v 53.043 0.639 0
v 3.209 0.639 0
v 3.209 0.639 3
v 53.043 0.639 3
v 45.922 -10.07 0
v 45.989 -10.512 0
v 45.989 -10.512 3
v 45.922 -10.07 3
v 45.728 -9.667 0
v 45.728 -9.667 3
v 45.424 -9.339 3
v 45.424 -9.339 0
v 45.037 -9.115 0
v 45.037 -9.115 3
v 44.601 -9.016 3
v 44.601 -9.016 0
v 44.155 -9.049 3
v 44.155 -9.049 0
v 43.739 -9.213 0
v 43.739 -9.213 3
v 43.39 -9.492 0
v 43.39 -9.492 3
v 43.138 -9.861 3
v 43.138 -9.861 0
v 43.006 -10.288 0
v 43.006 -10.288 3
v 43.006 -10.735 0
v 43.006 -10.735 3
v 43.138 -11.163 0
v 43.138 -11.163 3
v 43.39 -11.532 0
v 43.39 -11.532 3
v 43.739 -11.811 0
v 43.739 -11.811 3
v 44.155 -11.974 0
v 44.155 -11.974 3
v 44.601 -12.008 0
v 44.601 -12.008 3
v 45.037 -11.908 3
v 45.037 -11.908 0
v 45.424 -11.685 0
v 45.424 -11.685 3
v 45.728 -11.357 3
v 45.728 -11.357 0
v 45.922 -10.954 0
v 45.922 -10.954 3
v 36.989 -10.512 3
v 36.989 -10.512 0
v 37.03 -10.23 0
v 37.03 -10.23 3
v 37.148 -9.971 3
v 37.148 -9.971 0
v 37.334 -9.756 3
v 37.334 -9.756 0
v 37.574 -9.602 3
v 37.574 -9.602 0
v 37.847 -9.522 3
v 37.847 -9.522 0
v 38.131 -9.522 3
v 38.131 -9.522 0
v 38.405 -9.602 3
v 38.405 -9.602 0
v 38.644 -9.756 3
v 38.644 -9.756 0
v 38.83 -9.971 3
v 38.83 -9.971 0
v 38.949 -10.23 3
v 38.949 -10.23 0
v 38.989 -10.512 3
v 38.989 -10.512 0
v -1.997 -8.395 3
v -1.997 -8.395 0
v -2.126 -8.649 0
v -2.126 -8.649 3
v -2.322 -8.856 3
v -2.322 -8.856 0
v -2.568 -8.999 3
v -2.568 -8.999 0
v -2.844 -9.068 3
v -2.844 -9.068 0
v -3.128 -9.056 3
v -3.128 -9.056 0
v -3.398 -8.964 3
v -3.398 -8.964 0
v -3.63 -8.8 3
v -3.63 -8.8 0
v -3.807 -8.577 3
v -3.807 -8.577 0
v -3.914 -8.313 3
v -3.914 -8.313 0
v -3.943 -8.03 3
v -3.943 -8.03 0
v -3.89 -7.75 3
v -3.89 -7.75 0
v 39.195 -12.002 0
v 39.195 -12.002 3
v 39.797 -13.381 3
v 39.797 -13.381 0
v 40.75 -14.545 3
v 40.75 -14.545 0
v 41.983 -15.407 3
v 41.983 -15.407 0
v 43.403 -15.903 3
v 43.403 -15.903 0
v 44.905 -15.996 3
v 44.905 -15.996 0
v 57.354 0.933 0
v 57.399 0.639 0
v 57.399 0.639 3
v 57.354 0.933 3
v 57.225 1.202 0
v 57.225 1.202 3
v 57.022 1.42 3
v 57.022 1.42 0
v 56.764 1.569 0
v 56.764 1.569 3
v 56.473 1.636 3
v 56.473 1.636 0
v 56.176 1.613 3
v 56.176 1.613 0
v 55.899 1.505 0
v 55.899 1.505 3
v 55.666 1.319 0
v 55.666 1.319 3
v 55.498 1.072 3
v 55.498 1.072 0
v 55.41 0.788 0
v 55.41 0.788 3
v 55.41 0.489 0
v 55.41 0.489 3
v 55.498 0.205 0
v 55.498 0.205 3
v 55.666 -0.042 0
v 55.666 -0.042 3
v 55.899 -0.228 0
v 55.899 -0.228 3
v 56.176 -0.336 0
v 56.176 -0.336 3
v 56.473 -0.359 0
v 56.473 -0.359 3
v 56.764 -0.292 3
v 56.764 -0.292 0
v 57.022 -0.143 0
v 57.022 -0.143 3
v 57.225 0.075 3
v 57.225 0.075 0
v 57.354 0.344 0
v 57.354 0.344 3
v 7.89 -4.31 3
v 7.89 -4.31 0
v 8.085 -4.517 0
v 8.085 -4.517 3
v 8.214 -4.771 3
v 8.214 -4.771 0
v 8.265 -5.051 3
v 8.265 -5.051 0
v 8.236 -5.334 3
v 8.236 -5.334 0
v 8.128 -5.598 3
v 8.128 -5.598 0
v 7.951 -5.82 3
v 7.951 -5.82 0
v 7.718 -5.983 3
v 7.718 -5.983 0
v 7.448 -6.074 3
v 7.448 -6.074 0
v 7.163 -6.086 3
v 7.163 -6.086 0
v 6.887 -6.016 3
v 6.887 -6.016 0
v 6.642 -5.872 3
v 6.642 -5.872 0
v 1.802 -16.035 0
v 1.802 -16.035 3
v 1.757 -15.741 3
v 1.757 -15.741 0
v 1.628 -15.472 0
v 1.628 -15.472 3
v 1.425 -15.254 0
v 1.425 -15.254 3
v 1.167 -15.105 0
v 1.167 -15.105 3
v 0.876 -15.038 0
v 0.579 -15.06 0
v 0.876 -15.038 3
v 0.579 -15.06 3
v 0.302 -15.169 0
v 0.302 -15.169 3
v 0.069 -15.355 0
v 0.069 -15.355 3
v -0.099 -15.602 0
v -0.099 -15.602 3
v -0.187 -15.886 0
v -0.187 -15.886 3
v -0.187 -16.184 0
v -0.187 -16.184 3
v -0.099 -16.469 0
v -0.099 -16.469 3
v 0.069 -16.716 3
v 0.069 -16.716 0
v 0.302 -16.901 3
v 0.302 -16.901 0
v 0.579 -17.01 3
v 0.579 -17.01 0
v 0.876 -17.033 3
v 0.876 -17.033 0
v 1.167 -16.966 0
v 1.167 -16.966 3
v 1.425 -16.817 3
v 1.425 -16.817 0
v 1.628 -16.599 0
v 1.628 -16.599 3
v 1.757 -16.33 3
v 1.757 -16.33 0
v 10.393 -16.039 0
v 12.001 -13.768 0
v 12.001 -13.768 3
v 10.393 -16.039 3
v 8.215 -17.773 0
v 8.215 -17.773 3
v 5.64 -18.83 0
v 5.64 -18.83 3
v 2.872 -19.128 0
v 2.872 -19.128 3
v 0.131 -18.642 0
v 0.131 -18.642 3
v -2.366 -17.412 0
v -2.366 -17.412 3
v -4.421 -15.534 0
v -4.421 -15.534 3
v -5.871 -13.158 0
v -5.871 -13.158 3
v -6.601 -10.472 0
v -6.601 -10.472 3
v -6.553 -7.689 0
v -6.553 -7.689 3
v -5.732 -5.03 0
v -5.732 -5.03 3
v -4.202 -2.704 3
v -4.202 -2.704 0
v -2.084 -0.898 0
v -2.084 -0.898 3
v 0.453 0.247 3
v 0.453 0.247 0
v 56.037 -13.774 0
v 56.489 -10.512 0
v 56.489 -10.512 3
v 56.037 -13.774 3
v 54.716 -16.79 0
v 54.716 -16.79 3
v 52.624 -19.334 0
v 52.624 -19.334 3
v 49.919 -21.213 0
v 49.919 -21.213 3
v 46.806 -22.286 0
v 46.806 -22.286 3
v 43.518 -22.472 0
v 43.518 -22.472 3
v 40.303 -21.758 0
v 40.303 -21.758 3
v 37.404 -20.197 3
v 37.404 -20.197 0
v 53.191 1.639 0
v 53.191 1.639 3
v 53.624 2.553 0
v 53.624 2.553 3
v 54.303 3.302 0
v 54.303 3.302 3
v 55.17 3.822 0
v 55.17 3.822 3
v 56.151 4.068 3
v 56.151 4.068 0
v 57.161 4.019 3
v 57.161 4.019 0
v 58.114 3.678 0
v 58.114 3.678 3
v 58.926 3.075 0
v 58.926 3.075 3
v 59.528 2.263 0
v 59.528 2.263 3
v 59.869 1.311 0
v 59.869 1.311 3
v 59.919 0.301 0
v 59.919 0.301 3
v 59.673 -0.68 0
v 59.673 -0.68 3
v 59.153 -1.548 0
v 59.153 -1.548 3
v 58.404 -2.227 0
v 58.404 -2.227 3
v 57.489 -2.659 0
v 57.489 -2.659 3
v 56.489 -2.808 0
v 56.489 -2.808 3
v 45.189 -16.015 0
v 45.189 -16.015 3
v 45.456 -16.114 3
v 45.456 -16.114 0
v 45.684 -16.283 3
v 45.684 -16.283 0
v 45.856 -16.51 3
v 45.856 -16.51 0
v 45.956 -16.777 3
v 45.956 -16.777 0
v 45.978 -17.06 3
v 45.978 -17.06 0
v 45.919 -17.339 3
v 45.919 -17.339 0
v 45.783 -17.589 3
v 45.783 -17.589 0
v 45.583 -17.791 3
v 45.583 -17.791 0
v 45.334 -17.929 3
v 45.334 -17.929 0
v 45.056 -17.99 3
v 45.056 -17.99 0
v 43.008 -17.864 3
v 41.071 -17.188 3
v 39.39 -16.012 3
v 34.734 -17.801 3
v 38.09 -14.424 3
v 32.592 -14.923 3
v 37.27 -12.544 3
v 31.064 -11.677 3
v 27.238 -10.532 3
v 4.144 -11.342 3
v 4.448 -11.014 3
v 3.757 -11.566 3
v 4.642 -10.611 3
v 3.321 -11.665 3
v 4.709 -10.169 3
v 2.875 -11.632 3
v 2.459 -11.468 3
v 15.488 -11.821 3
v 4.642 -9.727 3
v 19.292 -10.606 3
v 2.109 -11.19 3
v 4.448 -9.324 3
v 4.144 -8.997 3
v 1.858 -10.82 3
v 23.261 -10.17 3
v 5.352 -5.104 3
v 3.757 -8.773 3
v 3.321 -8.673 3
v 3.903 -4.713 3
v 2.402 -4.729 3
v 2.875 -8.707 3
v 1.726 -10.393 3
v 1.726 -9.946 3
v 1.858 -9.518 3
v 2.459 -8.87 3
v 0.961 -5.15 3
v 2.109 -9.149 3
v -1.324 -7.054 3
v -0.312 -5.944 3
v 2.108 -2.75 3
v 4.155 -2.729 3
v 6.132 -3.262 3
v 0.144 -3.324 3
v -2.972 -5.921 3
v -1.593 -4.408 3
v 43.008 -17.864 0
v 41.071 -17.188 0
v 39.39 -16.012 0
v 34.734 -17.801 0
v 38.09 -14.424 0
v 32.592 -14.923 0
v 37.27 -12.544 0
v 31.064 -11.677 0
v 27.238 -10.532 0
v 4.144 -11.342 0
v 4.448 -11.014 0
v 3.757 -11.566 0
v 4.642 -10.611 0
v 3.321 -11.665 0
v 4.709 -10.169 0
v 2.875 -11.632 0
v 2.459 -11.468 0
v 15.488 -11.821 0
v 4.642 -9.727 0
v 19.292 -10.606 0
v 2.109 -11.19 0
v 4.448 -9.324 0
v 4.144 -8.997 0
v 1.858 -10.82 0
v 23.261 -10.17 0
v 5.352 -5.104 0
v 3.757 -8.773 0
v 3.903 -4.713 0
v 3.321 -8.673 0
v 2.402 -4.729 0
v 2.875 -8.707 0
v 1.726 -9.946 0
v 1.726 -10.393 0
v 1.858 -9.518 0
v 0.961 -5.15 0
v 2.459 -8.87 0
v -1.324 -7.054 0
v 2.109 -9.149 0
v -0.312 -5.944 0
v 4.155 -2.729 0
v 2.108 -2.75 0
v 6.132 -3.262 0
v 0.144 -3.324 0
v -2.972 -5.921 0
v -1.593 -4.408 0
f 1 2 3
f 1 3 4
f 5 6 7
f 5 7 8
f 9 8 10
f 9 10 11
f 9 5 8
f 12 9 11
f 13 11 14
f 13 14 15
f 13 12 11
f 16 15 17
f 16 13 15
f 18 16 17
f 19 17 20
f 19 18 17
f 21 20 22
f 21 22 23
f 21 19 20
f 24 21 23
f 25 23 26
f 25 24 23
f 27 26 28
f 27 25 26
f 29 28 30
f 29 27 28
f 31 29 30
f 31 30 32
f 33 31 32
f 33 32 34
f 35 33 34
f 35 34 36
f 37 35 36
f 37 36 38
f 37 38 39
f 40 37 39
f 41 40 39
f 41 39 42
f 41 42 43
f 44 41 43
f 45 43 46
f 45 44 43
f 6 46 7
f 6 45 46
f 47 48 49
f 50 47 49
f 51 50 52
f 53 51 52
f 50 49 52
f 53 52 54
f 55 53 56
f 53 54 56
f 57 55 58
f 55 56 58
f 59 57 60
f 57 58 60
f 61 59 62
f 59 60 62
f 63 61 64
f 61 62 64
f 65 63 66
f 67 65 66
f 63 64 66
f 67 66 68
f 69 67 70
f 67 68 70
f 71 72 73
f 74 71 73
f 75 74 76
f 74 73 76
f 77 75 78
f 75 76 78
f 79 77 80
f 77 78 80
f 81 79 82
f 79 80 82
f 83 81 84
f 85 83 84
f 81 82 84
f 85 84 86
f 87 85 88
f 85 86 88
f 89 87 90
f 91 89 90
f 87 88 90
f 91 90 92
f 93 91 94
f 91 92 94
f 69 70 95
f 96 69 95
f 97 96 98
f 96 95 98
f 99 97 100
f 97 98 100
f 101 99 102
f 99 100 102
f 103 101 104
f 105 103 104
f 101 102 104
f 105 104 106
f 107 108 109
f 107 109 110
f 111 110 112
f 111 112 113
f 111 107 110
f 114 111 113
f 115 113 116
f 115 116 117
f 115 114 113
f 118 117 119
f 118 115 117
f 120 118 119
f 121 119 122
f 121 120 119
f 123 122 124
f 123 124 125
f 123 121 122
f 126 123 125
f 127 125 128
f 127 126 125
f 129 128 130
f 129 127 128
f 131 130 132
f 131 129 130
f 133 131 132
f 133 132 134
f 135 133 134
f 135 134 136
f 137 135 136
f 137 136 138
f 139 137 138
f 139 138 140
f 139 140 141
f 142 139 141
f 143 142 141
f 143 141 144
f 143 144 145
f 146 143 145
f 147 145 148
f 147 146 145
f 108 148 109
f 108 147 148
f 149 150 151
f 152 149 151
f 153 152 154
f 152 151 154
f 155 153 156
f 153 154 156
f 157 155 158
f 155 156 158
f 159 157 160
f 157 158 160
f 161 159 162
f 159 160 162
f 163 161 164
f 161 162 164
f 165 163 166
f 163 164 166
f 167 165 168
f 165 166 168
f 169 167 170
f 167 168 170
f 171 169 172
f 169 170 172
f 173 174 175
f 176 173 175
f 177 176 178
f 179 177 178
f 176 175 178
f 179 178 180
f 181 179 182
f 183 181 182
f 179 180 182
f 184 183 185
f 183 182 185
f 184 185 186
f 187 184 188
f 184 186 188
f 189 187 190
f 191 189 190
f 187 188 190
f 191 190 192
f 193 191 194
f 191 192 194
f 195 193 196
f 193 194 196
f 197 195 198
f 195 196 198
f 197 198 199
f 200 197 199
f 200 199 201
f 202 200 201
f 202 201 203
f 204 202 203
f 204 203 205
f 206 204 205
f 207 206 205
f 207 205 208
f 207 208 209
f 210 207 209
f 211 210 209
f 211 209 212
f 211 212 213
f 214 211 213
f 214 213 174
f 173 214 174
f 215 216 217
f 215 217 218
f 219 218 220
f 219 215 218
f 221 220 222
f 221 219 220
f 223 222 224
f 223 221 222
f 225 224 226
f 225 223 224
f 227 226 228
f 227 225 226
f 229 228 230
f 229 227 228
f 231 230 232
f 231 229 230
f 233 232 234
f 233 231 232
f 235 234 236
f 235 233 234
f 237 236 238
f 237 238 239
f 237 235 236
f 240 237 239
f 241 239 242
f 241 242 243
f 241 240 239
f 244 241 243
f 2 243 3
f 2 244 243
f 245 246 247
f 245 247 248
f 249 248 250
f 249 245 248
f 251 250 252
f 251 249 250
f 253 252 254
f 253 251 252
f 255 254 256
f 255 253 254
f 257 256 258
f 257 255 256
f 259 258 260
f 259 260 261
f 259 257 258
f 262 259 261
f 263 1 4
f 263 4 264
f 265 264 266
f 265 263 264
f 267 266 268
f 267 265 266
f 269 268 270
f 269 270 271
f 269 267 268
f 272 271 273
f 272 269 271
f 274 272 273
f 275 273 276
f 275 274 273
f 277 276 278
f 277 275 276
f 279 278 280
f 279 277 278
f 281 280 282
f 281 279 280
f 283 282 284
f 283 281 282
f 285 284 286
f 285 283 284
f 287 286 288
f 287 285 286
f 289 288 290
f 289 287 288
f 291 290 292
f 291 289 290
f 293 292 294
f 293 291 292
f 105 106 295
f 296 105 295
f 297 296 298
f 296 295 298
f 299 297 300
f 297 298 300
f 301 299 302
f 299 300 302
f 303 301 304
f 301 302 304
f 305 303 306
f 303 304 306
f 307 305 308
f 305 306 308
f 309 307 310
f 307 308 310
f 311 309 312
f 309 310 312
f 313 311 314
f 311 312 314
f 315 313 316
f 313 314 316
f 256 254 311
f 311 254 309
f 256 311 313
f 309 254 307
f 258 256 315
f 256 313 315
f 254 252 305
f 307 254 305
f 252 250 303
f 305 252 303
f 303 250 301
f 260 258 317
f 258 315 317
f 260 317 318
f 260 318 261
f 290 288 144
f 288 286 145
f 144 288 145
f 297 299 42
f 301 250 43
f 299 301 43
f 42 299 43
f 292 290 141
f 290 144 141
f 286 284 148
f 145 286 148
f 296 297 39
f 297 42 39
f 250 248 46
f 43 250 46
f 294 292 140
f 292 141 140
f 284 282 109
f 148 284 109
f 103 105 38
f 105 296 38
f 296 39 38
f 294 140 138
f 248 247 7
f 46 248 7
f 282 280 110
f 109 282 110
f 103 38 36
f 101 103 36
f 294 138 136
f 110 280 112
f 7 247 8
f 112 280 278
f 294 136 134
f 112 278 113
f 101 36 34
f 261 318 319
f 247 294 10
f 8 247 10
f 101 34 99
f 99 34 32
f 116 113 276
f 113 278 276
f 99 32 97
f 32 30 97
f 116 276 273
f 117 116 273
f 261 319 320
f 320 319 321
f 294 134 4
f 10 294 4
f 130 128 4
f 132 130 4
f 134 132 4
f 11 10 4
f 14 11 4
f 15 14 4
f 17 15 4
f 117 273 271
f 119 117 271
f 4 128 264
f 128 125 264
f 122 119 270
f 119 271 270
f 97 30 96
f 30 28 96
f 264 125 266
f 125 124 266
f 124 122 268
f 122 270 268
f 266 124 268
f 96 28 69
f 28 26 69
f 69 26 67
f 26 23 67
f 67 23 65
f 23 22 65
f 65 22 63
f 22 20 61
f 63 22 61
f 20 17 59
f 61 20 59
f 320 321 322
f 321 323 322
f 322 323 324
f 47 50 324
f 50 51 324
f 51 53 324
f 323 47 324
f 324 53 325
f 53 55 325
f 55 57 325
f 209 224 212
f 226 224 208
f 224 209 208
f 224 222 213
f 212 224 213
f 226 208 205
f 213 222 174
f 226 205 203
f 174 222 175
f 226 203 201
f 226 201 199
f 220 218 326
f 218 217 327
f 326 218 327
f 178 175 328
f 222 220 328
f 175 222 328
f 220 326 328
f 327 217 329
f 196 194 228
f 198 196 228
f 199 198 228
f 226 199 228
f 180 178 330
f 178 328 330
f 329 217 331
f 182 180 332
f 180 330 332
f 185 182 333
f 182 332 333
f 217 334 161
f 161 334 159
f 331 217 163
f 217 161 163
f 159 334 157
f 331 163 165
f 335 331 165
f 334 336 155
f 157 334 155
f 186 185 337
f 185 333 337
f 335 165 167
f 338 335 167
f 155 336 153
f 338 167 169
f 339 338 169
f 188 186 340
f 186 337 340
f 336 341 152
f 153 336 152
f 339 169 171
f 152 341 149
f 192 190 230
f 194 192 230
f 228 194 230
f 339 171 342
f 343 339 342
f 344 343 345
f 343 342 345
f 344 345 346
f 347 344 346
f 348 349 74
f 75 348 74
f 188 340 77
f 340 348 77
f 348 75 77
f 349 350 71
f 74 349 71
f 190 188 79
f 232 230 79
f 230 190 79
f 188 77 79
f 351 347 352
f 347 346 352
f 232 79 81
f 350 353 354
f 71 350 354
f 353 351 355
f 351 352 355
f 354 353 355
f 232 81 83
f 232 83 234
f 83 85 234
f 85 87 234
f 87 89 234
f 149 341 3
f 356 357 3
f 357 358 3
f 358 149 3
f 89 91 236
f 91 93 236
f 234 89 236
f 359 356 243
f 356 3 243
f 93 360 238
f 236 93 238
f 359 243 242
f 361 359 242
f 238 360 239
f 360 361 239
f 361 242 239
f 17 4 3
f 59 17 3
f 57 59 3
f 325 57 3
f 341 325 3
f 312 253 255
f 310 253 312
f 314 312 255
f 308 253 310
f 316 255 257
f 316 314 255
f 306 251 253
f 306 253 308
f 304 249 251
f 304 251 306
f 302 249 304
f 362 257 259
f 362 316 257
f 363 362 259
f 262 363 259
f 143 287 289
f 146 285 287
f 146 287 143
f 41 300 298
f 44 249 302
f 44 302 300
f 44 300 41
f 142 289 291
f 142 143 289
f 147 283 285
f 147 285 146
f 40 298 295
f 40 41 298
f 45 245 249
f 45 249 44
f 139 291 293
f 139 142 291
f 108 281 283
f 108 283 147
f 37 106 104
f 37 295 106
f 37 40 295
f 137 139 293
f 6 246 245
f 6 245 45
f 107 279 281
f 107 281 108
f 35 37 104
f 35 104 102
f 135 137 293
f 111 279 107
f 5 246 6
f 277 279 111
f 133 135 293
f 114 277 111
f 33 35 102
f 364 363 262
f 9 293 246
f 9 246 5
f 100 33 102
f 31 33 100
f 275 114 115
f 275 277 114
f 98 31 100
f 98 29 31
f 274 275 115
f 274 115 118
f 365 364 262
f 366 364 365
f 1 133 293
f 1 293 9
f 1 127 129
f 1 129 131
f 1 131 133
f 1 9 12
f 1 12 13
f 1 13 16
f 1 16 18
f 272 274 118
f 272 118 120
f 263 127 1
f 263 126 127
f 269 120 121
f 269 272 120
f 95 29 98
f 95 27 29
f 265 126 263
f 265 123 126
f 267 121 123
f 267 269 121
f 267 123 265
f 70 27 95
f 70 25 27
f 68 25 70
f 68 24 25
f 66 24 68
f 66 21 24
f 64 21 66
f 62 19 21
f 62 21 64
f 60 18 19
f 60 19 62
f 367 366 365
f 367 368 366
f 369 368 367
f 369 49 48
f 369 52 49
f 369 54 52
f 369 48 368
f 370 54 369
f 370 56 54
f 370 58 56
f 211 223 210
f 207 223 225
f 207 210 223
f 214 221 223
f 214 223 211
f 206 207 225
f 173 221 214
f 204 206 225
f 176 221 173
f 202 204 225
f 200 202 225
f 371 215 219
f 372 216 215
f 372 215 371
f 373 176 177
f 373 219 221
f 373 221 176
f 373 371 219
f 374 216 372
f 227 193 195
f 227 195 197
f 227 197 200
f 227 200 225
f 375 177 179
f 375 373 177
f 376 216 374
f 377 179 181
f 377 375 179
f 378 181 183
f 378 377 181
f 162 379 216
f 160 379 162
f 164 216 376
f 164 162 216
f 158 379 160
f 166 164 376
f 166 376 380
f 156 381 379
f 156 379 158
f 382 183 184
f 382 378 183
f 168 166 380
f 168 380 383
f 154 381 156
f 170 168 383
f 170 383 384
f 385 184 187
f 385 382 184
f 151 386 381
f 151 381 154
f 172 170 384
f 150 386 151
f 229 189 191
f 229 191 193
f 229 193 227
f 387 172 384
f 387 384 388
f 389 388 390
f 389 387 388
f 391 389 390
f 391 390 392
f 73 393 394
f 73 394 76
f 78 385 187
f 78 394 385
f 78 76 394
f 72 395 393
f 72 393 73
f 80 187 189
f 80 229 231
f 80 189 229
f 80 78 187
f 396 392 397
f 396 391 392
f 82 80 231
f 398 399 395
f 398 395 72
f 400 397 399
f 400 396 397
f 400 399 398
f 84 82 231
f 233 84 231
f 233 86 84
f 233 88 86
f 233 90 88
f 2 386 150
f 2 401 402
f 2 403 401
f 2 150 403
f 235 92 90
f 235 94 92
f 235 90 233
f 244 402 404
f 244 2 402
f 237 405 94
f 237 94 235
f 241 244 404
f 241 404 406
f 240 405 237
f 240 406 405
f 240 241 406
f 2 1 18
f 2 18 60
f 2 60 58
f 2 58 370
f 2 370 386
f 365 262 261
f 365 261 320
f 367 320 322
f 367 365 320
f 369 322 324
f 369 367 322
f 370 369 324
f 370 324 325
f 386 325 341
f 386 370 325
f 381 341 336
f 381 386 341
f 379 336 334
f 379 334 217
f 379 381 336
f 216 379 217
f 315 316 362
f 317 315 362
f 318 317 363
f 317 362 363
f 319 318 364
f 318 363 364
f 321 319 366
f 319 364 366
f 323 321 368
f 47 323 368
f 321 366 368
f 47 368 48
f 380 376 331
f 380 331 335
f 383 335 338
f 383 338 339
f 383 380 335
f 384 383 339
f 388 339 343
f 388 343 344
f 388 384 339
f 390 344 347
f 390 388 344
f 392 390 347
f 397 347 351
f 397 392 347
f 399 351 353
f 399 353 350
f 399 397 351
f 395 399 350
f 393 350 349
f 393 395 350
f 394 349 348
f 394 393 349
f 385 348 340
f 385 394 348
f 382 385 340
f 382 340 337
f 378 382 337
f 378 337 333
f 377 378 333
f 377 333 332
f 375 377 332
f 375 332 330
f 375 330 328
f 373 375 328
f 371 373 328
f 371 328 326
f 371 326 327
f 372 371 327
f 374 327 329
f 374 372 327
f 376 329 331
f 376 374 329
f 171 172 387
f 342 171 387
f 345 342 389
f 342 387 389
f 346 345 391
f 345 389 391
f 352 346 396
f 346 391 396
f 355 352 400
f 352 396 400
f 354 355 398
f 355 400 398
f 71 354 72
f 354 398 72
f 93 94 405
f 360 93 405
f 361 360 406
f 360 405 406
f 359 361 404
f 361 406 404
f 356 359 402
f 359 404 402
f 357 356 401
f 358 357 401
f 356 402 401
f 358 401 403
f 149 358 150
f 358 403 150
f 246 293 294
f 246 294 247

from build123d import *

# Parameters (mm, degrees)
SKETCH1_R           = 1
SKETCH1_R_2         = 1.5
BOSS_EXTRUDE1_DEPTH = 3
SKETCH2_R           = 1
CUT_EXTRUDE1_DEPTH  = 10


with BuildPart() as part:
    # Sketch1 → Boss-Extrude1 (new body)
    with BuildSketch(Plane.XY):
        with BuildLine():
            Line((56.489085284, -2.807723586), (56.489085284, -10.511796182))
            ThreePointArc((56.489085284, -10.511796182), (49.919430424, -21.212793876), (37.403860007, -20.196814652))
            ThreePointArc((37.403860007, -20.196814652), (33.591182056, -16.415053625), (31.06380939, -11.676845415))
            ThreePointArc((31.06380939, -11.676845415), (21.265519298, -10.288514848), (12.001109648, -13.767690656))
            ThreePointArc((12.001109648, -13.767690656), (-5.229619348, -14.397609216), (3.208983014, 0.638507613))
            Line((3.208983014, 0.638507613), (53.042854085, 0.638507613))
            ThreePointArc((53.042854085, 0.638507613), (58.925938734, 3.075361063), (56.489085284, -2.807723586))
        make_face()
        with Locations((56.398708828, 0.638507613)):
            Circle(SKETCH1_R, mode=Mode.SUBTRACT)
        with Locations((44.489085284, -10.511796182)):
            Circle(SKETCH1_R_2, mode=Mode.SUBTRACT)
        with Locations((3.208983014, -10.169286947)):
            Circle(SKETCH1_R_2, mode=Mode.SUBTRACT)
        with BuildLine():
            ThreePointArc((38.989085284, -10.511796182), (40.749804307, -14.545129515), (44.90464084, -15.996074947))
            ThreePointArc((44.90464084, -15.996074947), (45.977337989, -16.917660986), (45.055751951, -17.990358135))
            ThreePointArc((45.055751951, -17.990358135), (39.39006577, -16.011796182), (36.989085284, -10.511796182))
            ThreePointArc((36.989085284, -10.511796182), (37.989085284, -9.511796182), (38.989085284, -10.511796182))
        make_face(mode=Mode.SUBTRACT)
        with BuildLine():
            ThreePointArc((6.641982325, -5.872251255), (1.667062363, -4.889847516), (-1.99710038, -8.395394139))
            ThreePointArc((-1.99710038, -8.395394139), (-3.266186962, -9.019428792), (-3.890221615, -7.75034221))
            ThreePointArc((-3.890221615, -7.75034221), (1.106363944, -2.970051359), (7.890345711, -4.309692822))
            ThreePointArc((7.890345711, -4.309692822), (8.047443234, -5.715153732), (6.641982325, -5.872251255))
        make_face(mode=Mode.SUBTRACT)
    extrude(amount=BOSS_EXTRUDE1_DEPTH)

    # Sketch2 → Cut-Extrude1 (cut)
    with BuildSketch(Plane.XY.offset(3)):
        with Locations((0.801619135, -16.035407907)):
            Circle(SKETCH2_R)
    extrude(amount=-CUT_EXTRUDE1_DEPTH, mode=Mode.SUBTRACT)


solid = part.part
